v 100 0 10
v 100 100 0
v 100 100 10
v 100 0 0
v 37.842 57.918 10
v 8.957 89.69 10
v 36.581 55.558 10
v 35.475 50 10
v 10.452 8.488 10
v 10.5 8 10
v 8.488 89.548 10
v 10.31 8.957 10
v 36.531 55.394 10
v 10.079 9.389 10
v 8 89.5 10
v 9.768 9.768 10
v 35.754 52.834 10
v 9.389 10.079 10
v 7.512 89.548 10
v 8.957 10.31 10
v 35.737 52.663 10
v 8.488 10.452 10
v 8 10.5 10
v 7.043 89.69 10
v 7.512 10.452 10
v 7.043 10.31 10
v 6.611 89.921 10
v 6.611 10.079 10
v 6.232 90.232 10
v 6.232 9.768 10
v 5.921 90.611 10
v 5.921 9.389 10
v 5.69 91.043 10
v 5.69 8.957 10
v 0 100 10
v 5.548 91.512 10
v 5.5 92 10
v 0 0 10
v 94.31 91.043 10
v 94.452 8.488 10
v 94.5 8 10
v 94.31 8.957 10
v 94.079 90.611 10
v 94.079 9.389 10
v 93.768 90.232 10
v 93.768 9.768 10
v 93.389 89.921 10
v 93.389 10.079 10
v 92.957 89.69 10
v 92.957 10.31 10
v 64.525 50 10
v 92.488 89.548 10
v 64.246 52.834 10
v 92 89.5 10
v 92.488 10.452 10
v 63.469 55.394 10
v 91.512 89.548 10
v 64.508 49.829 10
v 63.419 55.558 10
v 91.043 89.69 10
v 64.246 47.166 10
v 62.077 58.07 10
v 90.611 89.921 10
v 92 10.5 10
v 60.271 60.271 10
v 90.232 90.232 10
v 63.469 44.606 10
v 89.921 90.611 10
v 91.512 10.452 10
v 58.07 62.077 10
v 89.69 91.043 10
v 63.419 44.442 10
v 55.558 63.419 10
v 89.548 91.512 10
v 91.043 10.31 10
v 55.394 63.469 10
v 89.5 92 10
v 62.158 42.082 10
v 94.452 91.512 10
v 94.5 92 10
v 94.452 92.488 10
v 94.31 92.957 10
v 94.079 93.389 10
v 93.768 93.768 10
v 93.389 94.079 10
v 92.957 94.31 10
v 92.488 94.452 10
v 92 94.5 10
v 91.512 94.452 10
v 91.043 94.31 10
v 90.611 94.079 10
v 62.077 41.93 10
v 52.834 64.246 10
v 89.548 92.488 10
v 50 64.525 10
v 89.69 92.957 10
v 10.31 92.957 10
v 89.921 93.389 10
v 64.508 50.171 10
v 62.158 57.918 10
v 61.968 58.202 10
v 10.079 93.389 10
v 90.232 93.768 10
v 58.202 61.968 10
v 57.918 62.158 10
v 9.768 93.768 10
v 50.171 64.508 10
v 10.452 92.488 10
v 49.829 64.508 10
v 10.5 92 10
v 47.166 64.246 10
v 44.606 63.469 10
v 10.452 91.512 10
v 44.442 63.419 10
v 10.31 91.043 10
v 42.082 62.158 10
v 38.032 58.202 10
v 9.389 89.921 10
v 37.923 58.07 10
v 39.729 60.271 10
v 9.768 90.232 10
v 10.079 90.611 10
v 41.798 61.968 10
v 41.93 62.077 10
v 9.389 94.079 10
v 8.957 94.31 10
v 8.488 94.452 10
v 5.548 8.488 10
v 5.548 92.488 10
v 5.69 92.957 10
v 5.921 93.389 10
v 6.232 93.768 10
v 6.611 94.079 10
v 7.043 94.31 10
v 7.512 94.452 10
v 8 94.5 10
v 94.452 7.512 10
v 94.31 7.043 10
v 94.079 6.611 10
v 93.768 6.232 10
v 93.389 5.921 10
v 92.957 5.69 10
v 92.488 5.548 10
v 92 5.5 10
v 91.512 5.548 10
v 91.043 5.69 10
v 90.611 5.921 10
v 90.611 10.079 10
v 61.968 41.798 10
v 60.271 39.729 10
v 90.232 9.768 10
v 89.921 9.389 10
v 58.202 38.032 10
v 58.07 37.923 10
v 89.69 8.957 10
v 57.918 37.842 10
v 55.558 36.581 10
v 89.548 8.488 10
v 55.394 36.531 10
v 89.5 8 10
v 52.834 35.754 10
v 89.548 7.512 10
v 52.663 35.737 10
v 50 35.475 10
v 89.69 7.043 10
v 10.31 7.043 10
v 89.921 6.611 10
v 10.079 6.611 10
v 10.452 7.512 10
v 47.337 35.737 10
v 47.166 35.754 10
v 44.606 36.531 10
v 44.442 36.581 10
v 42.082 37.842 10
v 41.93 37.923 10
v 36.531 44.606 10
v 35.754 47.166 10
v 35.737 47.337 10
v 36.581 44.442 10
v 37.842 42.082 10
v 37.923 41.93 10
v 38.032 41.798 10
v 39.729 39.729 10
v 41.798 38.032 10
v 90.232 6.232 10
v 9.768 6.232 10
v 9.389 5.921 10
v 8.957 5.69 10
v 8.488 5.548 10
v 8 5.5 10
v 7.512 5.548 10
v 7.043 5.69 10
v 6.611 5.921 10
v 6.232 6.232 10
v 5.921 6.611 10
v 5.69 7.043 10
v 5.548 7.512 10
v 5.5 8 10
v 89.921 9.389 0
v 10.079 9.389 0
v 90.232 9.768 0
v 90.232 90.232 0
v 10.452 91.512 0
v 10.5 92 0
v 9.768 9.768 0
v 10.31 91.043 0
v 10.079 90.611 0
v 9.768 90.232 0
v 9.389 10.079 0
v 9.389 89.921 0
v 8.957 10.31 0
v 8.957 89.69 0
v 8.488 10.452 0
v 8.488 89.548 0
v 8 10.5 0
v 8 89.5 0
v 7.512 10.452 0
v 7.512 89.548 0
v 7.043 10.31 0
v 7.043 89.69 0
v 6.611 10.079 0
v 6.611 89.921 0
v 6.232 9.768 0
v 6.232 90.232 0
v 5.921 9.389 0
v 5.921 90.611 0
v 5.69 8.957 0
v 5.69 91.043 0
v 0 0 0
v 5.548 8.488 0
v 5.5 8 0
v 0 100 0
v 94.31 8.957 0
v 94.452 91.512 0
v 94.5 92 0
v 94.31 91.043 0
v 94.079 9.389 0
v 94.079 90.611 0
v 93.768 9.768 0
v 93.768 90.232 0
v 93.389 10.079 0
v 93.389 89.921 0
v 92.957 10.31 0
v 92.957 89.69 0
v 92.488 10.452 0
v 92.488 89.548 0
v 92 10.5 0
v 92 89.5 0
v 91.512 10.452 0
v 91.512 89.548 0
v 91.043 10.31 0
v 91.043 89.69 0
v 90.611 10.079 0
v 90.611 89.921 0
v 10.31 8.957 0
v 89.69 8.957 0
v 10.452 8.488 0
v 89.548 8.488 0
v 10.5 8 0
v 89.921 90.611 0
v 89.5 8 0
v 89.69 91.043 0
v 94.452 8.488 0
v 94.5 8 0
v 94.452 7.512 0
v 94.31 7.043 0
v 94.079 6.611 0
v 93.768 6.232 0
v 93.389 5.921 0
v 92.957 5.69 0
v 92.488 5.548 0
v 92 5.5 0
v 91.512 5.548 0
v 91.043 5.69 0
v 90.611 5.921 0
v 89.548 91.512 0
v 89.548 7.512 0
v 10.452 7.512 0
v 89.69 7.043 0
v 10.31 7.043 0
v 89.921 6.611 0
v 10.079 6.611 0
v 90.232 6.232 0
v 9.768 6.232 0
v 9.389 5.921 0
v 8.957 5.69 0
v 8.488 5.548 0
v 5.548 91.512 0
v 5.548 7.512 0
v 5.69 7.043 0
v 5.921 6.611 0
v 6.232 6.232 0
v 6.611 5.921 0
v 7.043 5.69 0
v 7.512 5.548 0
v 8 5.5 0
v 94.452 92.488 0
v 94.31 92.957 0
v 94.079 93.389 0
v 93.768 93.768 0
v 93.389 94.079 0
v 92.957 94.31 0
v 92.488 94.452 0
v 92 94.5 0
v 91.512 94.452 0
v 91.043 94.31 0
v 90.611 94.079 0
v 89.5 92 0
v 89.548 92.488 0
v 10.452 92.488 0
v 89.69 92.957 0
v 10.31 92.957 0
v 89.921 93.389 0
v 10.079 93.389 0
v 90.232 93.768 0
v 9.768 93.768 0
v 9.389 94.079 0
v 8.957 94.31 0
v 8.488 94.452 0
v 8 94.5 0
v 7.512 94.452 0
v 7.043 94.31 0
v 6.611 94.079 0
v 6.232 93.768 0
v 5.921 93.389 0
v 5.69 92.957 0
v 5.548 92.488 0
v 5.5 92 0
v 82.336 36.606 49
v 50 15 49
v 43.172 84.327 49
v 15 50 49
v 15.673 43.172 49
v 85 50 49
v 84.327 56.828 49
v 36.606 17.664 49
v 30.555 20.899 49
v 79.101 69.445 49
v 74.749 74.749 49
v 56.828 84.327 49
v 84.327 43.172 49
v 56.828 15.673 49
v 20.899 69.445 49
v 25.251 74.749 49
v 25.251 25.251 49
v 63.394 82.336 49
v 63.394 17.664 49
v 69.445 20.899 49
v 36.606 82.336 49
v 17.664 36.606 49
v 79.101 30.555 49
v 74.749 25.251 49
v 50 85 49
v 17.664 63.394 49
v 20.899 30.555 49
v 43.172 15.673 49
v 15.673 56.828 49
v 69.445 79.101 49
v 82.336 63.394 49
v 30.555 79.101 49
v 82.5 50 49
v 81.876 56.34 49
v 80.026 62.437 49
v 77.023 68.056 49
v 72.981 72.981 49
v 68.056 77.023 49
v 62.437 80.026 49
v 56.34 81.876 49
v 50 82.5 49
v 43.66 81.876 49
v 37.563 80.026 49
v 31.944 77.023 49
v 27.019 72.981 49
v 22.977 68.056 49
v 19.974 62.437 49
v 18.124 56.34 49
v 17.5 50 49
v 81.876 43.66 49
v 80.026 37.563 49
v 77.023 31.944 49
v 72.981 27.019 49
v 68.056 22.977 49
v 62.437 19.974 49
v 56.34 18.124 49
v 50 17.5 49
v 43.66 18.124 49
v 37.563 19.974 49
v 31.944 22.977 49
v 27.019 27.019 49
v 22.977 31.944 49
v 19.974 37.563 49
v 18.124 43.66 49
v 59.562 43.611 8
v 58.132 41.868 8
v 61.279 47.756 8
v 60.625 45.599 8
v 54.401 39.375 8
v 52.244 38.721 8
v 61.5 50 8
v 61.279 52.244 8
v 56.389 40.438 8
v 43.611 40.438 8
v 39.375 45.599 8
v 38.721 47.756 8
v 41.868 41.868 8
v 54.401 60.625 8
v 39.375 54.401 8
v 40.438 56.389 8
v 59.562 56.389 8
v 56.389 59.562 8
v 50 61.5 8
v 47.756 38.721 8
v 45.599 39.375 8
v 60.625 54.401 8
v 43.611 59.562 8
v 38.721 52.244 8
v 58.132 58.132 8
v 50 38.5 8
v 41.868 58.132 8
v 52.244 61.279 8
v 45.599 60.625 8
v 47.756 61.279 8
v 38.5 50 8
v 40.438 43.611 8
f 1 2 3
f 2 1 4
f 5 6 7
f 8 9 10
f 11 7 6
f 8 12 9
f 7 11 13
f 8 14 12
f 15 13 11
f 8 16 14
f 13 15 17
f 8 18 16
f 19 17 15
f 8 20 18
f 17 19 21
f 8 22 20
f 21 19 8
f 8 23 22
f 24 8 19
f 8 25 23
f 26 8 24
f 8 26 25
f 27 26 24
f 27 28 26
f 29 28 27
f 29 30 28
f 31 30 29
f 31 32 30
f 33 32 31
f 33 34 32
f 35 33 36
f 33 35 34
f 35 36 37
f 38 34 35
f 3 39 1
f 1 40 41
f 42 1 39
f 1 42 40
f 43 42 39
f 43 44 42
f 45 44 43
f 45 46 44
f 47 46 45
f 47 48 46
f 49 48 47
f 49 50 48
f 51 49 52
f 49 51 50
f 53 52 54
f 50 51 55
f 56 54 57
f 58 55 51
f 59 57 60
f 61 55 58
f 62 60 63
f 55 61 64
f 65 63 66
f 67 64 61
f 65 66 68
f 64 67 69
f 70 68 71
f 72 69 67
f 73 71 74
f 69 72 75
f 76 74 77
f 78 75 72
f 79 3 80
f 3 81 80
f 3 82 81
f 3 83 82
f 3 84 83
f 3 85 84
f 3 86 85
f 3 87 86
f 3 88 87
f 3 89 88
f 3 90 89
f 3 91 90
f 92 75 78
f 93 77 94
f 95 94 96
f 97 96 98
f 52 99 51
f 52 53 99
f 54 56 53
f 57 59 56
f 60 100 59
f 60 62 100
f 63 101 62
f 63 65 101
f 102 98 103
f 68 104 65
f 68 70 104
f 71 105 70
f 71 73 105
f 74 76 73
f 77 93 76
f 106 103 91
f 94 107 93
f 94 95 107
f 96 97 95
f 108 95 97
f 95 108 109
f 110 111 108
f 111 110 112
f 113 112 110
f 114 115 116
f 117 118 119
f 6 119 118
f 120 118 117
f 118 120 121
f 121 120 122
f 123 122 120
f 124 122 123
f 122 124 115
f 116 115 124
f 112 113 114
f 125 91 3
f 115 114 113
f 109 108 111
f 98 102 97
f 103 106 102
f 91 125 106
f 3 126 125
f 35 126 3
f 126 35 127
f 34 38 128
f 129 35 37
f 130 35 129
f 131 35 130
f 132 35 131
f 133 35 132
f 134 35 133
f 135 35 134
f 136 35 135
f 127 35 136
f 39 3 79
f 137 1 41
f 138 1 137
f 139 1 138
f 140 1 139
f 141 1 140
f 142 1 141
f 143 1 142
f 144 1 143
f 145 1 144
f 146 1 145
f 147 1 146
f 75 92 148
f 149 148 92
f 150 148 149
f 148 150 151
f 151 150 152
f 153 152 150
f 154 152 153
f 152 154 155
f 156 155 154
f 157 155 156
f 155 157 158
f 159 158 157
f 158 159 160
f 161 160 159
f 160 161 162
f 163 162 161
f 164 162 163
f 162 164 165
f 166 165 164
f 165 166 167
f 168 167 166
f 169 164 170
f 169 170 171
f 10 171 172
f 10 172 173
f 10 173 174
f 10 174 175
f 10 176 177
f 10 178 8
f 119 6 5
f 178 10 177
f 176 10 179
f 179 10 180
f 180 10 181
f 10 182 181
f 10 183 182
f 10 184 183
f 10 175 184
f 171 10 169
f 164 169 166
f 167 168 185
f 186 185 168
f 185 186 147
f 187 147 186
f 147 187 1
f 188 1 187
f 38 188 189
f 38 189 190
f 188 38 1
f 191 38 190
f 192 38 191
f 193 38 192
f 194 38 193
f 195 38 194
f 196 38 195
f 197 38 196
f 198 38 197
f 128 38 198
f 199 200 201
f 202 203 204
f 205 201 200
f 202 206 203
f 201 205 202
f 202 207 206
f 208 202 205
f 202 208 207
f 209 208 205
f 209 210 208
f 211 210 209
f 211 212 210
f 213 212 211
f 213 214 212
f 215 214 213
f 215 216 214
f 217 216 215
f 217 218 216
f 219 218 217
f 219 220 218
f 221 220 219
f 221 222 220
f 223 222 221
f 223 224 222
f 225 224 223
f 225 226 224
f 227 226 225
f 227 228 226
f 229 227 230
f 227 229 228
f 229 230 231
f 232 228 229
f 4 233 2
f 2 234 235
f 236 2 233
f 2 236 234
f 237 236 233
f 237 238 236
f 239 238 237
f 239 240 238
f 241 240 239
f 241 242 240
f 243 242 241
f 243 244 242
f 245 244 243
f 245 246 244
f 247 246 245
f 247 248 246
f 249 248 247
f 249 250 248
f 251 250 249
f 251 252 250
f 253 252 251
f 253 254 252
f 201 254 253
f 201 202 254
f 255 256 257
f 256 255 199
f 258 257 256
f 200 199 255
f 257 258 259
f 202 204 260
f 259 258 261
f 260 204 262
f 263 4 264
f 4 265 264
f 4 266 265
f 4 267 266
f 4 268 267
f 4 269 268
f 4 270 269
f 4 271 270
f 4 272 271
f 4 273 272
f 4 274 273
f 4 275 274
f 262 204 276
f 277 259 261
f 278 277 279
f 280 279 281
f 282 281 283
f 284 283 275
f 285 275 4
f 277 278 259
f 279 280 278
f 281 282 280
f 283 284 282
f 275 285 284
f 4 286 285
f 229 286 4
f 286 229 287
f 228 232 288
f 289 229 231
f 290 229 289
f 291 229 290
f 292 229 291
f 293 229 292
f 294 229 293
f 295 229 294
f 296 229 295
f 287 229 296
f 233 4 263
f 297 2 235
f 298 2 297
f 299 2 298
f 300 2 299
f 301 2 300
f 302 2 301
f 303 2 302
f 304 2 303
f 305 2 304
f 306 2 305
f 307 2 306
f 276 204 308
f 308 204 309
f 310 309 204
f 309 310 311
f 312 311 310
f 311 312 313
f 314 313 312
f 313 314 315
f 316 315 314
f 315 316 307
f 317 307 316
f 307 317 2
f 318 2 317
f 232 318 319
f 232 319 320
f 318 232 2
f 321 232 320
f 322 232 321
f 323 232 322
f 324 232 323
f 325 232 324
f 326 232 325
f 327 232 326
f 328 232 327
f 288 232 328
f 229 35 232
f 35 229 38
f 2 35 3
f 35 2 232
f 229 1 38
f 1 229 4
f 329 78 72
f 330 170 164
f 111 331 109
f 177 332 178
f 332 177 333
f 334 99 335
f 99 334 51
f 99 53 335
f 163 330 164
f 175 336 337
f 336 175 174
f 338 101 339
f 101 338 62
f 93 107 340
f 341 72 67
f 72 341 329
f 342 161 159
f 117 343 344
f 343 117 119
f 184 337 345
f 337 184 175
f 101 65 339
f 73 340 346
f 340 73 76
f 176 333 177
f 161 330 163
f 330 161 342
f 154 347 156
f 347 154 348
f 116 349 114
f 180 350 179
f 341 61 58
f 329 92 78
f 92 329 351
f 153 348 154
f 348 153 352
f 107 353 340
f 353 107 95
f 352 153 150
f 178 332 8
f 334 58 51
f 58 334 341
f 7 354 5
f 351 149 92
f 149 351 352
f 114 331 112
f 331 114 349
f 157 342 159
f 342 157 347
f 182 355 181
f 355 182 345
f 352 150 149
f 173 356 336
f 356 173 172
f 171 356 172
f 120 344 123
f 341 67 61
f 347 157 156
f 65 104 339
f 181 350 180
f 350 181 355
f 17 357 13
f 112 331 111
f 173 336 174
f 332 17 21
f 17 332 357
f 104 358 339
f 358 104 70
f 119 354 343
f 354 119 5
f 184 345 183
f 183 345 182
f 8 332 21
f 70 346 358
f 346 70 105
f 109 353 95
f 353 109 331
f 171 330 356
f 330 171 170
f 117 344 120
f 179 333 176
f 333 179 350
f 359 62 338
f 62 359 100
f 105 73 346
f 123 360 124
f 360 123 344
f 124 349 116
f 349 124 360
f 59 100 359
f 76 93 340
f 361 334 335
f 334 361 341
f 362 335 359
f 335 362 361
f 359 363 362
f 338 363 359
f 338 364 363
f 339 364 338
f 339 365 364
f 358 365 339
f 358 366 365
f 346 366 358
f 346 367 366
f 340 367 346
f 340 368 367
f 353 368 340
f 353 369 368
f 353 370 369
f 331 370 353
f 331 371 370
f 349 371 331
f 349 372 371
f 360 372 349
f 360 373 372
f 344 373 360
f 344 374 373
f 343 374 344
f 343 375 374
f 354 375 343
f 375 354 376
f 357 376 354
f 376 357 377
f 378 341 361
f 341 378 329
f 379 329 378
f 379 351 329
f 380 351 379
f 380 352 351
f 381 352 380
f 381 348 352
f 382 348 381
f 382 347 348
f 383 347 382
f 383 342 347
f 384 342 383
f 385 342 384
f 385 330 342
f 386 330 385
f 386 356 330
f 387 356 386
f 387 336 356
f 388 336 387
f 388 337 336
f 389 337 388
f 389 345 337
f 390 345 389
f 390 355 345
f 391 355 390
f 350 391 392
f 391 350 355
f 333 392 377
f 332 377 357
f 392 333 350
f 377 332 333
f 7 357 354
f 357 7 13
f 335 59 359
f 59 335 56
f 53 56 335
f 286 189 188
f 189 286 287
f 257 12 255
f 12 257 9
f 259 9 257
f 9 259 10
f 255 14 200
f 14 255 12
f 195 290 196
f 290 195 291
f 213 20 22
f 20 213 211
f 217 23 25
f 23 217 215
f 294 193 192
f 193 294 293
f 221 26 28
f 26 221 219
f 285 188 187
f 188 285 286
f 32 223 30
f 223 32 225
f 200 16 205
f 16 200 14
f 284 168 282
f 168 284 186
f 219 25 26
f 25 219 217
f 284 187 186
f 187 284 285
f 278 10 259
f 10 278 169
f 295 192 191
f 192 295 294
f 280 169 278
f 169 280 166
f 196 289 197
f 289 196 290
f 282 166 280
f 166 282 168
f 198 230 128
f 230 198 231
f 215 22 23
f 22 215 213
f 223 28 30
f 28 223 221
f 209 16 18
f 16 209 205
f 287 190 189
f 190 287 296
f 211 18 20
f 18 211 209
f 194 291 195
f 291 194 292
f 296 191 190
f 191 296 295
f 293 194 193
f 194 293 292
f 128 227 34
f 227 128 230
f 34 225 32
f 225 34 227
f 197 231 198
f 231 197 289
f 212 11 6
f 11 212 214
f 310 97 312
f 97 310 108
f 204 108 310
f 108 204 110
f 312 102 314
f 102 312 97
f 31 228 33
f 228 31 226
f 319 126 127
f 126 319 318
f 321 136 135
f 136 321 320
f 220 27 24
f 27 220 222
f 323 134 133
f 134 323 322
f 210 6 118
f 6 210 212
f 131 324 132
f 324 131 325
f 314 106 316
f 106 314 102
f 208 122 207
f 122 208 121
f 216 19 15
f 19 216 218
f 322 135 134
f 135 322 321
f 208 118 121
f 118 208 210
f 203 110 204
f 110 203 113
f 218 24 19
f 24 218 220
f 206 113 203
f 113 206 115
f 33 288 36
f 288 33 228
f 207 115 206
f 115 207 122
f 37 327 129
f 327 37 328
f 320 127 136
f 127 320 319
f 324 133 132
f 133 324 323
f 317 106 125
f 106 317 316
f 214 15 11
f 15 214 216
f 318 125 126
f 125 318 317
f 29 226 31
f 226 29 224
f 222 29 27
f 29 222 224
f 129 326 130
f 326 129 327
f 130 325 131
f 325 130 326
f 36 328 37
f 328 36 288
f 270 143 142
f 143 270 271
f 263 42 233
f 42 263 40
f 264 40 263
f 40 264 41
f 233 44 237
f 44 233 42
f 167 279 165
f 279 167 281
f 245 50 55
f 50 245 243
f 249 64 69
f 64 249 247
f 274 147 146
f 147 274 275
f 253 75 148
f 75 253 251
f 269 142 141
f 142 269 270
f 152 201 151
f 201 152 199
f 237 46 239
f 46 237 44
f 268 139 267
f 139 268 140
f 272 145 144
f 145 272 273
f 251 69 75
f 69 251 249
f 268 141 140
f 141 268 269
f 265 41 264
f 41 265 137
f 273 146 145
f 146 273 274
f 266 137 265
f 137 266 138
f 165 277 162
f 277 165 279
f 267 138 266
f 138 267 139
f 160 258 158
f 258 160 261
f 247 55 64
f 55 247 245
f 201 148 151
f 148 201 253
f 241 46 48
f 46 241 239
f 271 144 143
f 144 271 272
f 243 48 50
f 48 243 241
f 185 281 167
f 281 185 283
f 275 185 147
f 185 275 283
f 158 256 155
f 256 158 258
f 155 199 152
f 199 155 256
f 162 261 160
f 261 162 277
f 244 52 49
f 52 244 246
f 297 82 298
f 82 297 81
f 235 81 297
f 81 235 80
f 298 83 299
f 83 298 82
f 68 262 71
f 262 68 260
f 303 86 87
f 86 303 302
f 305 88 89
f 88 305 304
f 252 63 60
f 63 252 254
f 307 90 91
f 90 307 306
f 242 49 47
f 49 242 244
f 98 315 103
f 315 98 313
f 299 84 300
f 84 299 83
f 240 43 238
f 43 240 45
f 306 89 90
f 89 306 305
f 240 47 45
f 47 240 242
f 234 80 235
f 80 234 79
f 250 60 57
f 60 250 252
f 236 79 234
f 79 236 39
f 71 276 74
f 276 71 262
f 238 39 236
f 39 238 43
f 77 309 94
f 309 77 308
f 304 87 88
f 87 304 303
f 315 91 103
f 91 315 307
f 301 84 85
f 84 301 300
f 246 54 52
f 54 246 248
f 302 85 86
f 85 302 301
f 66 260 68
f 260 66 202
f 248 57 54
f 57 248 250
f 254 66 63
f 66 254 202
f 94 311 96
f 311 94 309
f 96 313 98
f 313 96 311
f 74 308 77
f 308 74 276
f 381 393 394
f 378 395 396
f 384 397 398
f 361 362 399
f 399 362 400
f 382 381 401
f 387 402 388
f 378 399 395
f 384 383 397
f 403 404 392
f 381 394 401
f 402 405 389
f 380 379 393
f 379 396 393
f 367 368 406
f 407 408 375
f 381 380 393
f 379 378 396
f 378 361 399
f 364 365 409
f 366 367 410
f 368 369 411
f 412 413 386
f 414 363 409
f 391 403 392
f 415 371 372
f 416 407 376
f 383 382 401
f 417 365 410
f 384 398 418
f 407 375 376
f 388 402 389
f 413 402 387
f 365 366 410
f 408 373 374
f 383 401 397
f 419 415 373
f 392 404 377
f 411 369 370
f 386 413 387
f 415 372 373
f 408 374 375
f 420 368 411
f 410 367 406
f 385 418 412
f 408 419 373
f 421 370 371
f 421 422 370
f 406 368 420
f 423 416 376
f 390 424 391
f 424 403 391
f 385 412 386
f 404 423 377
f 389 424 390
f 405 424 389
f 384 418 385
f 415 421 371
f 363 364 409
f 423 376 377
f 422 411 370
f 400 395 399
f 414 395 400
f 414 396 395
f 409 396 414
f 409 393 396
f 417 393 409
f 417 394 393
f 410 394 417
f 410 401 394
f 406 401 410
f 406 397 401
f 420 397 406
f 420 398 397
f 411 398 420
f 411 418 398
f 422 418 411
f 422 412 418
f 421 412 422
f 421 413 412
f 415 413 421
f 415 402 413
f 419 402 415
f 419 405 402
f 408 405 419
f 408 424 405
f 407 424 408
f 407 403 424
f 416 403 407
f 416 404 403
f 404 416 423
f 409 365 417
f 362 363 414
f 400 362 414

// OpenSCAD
$fn = 32;

// ----------------------------------------------------------------------
// Hopper: flanged with square flange
// ----------------------------------------------------------------------

// --- parameters (mm) ---
fl = 100;                 // flange side, X and Y
fl_t = 10;                // flange thickness
cone_h = 40;              // cone height above the flange
top_d = 70;               // cone mouth diameter
bot_d = 28;               // cone spout diameter
wall = 2.5;               // cone wall thickness
hole_r = 2.5;             // flange hole radius
hole_in = 8;              // hole inset from the corners

bore_d = bot_d - 2 * wall;  // spout bore diameter
total_h = fl_t + cone_h - 1;  // overall height

difference() {
  union() {
    cube([fl, fl, fl_t]);
    translate([fl / 2, fl / 2, fl_t - 1])
      cylinder(h = cone_h, d1 = bot_d, d2 = top_d);
  }
  translate([fl / 2, fl / 2, fl_t - 2])
    cylinder(h = cone_h + 1, d1 = bore_d, d2 = top_d - 2 * wall);
  for (sx = [0, 1], sy = [0, 1])
    translate([sx ? fl - hole_in : hole_in,
               sy ? fl - hole_in : hole_in, -1])
      cylinder(r = hole_r, h = fl_t + 2);
}
